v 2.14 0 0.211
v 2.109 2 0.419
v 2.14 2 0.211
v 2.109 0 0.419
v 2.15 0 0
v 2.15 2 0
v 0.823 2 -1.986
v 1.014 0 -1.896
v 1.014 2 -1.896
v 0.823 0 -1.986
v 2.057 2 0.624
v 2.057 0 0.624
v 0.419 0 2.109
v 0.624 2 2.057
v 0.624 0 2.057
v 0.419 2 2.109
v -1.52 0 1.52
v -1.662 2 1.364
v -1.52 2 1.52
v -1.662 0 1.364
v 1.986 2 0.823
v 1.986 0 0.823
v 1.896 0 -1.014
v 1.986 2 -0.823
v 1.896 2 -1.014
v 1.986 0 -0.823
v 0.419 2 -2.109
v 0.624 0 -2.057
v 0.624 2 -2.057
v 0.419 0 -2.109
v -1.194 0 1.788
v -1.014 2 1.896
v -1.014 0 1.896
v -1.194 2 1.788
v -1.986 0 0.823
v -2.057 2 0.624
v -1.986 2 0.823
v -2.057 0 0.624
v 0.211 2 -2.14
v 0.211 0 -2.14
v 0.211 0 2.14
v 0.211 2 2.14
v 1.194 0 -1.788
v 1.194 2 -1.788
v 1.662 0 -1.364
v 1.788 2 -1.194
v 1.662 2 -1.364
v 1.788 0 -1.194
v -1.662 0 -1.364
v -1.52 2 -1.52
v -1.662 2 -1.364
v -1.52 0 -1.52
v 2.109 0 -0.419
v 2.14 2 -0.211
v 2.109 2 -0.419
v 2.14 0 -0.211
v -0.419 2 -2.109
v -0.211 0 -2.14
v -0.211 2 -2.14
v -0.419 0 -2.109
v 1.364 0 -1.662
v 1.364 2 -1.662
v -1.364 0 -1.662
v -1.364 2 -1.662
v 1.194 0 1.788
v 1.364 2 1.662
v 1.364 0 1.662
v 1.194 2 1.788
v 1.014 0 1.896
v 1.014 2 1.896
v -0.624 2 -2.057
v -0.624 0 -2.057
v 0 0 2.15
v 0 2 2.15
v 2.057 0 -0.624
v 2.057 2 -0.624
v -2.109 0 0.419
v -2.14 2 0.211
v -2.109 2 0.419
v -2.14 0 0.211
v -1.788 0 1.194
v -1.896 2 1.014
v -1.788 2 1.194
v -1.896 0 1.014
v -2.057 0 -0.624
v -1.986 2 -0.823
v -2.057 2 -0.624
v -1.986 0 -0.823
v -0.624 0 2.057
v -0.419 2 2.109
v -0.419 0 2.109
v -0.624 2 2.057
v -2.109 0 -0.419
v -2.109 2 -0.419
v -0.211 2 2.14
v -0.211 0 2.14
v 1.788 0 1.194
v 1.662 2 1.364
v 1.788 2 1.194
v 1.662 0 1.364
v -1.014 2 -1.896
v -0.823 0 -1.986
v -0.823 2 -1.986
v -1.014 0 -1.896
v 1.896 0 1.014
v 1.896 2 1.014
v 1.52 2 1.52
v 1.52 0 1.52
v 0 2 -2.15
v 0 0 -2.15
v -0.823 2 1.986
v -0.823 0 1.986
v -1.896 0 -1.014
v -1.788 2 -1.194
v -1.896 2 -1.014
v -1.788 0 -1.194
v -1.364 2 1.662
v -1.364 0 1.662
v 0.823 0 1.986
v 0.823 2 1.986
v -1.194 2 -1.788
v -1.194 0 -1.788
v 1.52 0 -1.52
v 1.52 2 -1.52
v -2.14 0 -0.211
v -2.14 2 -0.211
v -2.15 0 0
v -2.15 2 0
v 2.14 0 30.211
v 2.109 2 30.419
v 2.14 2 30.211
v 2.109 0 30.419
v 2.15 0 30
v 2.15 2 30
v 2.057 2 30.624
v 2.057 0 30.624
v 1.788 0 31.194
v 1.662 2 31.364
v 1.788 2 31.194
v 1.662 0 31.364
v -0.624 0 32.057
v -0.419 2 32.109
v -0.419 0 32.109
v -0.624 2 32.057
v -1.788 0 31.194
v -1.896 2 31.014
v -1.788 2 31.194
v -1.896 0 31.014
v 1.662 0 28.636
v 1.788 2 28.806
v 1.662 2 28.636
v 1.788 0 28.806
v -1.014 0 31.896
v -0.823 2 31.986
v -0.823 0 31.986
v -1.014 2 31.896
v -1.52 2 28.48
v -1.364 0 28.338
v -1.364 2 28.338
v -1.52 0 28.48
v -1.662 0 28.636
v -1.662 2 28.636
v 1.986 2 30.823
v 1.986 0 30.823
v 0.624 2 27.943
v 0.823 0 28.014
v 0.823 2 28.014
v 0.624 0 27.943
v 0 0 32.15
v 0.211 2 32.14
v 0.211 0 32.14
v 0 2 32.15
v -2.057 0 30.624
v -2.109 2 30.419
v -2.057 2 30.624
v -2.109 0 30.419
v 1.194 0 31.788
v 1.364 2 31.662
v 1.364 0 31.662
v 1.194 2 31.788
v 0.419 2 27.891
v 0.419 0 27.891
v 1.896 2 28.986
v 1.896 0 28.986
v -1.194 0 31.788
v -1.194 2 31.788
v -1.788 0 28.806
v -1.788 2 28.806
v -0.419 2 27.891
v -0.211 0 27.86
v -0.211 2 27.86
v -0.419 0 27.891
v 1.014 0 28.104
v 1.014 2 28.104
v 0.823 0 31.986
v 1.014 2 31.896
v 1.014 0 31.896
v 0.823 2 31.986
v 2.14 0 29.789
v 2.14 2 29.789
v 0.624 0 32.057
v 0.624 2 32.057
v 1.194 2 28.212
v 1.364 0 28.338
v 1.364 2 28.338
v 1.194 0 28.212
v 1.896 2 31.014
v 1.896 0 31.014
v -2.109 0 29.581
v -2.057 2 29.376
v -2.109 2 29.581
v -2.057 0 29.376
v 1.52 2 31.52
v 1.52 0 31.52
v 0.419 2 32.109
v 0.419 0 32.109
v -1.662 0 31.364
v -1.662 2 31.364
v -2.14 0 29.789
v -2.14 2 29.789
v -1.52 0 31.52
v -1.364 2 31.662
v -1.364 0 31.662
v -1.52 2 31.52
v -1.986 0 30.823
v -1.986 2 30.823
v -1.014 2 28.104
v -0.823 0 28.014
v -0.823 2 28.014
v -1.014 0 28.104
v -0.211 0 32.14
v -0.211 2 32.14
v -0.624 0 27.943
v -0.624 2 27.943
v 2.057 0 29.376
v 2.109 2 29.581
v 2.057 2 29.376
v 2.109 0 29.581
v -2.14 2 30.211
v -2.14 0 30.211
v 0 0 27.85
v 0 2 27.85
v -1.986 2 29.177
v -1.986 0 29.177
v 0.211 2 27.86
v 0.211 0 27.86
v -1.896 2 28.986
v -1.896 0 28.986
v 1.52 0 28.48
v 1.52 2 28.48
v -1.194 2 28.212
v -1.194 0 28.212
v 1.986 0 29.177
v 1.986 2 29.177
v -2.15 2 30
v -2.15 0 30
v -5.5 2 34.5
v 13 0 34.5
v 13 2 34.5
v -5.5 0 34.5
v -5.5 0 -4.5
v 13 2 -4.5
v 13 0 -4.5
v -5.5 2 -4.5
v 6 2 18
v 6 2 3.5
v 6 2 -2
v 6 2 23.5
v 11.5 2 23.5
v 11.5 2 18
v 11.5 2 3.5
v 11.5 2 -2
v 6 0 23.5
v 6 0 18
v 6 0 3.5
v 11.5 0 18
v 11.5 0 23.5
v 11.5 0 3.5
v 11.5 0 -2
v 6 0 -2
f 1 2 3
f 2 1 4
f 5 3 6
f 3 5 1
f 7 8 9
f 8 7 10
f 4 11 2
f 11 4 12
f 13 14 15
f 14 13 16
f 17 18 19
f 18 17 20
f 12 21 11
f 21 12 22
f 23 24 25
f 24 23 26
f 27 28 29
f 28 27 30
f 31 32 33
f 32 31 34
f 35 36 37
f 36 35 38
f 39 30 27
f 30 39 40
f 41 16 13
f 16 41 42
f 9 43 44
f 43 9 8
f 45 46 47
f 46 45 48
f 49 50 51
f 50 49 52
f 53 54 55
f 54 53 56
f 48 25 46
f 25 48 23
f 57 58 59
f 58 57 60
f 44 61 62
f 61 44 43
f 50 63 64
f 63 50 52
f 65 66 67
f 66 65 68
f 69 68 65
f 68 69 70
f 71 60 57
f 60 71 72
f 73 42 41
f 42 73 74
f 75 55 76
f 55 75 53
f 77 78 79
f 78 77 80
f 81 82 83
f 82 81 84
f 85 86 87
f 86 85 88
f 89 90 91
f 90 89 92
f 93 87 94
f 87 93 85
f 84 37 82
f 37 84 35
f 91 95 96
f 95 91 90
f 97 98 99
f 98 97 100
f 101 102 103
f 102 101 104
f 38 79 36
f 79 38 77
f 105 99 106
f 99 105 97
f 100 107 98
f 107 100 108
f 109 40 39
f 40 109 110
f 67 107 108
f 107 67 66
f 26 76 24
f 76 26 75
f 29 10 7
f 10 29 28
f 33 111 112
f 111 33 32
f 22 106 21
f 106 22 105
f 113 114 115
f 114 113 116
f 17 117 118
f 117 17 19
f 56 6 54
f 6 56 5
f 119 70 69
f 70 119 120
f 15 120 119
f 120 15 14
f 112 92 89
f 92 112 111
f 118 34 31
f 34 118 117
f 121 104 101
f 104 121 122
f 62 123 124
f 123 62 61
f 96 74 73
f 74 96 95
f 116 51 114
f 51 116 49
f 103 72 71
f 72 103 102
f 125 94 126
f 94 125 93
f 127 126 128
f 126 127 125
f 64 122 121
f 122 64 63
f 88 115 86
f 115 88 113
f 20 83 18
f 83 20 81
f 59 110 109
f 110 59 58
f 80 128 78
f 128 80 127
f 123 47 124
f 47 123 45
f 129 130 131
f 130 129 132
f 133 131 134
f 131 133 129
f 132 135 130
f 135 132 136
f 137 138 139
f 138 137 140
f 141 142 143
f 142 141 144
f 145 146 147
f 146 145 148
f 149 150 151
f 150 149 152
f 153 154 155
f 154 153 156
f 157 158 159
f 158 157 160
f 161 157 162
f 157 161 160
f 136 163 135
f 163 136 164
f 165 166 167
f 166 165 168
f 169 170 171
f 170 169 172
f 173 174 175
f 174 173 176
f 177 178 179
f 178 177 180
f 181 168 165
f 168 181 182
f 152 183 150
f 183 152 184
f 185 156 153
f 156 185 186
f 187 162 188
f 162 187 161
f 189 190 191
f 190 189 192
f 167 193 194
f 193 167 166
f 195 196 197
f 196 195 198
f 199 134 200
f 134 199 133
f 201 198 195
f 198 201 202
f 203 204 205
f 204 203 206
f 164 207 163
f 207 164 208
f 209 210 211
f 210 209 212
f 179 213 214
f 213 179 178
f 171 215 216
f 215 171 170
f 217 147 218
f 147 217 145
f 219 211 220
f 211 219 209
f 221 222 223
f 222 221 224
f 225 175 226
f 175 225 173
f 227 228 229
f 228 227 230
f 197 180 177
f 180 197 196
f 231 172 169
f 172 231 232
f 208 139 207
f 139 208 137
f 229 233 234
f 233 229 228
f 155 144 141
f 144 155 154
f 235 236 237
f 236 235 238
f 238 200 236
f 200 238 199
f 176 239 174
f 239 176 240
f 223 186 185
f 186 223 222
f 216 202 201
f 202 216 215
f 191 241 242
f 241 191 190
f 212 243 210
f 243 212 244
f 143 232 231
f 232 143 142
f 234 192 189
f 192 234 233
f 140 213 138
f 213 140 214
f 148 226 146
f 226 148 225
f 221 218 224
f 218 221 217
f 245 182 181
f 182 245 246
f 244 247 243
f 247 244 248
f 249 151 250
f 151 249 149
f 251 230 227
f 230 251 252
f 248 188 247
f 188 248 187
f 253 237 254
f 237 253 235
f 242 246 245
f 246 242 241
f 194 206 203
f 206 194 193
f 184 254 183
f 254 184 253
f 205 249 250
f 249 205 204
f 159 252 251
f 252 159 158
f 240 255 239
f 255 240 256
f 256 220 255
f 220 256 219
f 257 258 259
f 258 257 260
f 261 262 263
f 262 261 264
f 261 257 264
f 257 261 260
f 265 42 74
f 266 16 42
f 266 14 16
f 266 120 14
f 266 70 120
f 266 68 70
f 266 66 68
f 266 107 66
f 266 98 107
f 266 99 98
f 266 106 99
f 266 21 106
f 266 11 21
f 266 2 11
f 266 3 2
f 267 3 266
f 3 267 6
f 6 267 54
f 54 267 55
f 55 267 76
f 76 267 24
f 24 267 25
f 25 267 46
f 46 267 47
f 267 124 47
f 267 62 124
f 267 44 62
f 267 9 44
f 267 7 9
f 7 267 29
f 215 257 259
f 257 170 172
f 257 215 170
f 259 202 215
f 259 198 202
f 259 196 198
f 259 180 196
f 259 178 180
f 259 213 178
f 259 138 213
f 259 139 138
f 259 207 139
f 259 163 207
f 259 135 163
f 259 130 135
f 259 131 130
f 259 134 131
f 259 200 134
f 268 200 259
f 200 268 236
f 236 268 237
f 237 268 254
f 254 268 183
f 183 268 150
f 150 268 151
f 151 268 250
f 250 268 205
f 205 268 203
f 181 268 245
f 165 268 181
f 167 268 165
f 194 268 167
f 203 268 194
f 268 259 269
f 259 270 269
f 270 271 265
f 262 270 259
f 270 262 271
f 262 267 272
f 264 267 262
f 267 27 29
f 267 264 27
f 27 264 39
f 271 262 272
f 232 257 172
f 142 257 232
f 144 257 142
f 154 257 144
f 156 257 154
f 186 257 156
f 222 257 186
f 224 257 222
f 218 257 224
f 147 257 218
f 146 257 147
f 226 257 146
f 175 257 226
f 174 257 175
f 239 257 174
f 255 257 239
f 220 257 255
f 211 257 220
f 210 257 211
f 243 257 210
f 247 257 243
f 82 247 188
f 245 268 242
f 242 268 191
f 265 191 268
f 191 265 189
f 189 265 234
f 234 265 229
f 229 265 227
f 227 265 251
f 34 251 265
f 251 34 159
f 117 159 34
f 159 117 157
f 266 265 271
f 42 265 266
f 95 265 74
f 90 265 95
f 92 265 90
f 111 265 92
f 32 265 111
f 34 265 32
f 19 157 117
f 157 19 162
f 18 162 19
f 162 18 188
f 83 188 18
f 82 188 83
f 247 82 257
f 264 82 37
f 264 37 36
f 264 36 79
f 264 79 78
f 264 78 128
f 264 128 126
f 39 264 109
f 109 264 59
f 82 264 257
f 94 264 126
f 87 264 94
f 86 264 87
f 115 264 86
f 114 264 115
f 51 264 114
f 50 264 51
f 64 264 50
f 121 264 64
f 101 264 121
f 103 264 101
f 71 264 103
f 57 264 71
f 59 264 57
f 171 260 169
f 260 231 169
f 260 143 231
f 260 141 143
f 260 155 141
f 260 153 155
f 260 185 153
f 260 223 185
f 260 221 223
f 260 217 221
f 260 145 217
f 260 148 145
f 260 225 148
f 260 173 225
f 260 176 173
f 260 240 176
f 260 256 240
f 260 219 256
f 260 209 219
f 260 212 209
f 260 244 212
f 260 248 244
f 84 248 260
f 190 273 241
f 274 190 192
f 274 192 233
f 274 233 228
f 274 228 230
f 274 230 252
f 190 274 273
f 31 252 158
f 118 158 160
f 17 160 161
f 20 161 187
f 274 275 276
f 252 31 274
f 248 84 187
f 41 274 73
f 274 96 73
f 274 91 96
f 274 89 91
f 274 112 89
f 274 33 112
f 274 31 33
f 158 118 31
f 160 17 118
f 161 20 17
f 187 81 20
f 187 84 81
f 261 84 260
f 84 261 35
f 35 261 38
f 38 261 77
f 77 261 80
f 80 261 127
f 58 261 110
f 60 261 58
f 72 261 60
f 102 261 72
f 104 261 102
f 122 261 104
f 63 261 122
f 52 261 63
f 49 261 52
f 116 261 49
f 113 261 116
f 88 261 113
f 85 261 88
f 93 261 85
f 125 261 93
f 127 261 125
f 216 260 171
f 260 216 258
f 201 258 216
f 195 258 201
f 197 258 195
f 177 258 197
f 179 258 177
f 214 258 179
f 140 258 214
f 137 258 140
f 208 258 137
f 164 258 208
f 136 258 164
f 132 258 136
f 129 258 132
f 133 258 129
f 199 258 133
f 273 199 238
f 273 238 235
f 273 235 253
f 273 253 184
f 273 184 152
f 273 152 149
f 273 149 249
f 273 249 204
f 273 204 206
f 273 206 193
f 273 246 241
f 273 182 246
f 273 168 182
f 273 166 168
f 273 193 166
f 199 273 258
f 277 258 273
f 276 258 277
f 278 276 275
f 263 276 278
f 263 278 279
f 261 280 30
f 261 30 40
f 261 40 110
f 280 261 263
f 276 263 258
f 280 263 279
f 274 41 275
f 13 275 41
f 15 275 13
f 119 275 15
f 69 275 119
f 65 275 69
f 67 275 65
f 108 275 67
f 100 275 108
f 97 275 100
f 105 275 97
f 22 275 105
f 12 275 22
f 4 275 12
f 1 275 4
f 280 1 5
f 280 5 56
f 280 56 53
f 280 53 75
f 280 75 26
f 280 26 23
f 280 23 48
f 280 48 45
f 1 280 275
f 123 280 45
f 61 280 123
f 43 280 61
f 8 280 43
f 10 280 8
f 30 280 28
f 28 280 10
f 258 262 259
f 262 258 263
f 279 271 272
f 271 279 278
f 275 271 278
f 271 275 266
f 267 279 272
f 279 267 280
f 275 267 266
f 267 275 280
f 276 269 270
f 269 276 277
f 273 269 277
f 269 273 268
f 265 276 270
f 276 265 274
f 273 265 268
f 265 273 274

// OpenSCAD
// file: rockpro.scad
include <../common.scad>

// All coordinates are in [x,y], or [x,y,z] format

pcbDimensions = [79.41, 127.06]; // [x,y]
pcbThickness = 1.22;

// TODO move mount points
mountPoints = [[0,0,0], [0,118,0], [71.0,118, 0], [71.0,0,0]];

module mountPoints_N(cylHeight, cylRad1, cylRad2, cylFn, center) {
  for (i=[0:3]) {
    p = mountPoints[i];
    translate(v=[p[0], p[1], p[2]])
    cylinder(r1=cylRad1, r2=cylRad2, h=cylHeight, $fn=cylFn, center=center);
  }
  
}

module pcb() {
  cube(size=[pcbDimensions[0], pcbDimensions[1], pcbThickness]);
}

// defined on x-z plane, start at top of pcb
module frontFaceIOCutouts_N() {
  translate(v=[9,0,0])
    cube(size=[26.0,inf50,7.5]);

  translate(v=[35,0,0])
    cube(size=[35,inf50,17.9]);
}
module backFaceIOCutouts_N() {
  translate(v=[9,0,0])
    cube(size=[61,inf50,14]);
}


module cutoutProfile_N() {

  color([1,0,1])
  union() {
  mirror(v=[0,1,0])
    translate(v=[0,-1,pcbThickness])
    frontFaceIOCutouts_N();

  translate(v=[0,pcbDimensions[1]-1, pcbThickness])
  backFaceIOCutouts_N();
  }

  color([0.3,0.8,0.1])
  difference() {
    pcb();
    translate(v=[3.75, 3.75])
      mountPoints_N(10,2,2,10,true);
  }
}

//cutoutProfile_N();


//mountPoints_N(10,2,2, true);
// file: ../rack/screws.scad
/* Some common screw dimensions */


inf = 400; // basically infinity

/********************************************************************************/
// M3 dimensions

m3HoleRadiusSlack = 0.15;
m3Diameter = 3.0;
m3Radius = m3Diameter/2.0;

m3RadiusSlacked = m3Radius + m3HoleRadiusSlack;

// legacy TODO: replace
m3ptr = m3RadiusSlacked;

// NUTS!
m3HexNutWidthAcrossFlats = 5.41;
m3HexNutWidthAcrossCorners = FtoG(m3HexNutWidthAcrossFlats);

m3HexNutThickness = 2.18;

module m3HexNutPocketNegative() {
  hexNutPocketNegative(m3RadiusSlacked,
                       m3HexNutWidthAcrossCorners/2 + 0.1,
                       m3HexNutThickness + 0.2);
}


// TODO: remove test

*difference() {
  cube(size=[8,12,5], center=true);

  rotate(a=[0,0,20])
  m3HexNutPocketNegative();
}

*m3HexNutPocketNegative();


/********************************************************************************/
// M4 dimensions

m4HoleRadiusSlack = 0.15;
m4Diameter = 4.0;
m4Radius = m4Diameter/2.0;
m4RadiusSlacked = m4Radius + m4HoleRadiusSlack;

m4HexNutWidthAcrossFlats = 6.89;
m4HexNutWidthAcrossCorners = FtoG(m4HexNutWidthAcrossFlats);

m4HexNutThickness = 3.07;

module m4HexNutPocketNegative() {
  hexNutPocketNegative(m4RadiusSlacked,
                       m4HexNutWidthAcrossCorners/2 + 0.1,
                       m4HexNutThickness + 0.2);
}


// TODO: remove test

*difference() {
  translate(v=[0,1,0])
  cube(size=[10,12,6], center=true);

  rotate(a=[0,0,20])
  m4HexNutPocketNegative();
}

*m4HexNutPocketNegative();

/********************************************************************************/

// Convert a regular hexagon widthAcrossFlats to widthAcrossCorners
function FtoG(widthAcrossFlats) = widthAcrossFlats * (2/sqrt(3));  

// Convert a regular hexagon widthAcrossCorners to widthAcrossFlats
function GtoF(widthAcrossCorners) =  widthAcrossCorners * (sqrt(3)/2);


module hexNutPocketNegative(
  innerRadius,
  widthAcrossCorners,
  thickness)
{

  union() {

    hull() {
      // hexagonal cylinder representing where the nut should fit
      cylinder(r=widthAcrossCorners, h=thickness, center=true, $fn=6);

      // negative volume for sliding in the nut
      translate(v=[inf,0,0])
      cylinder(r=widthAcrossCorners, h=thickness, center=true, $fn=6);
    }

    // negative volume for screw lead
    translate(v=[0,0,-10])
    cylinder(r=innerRadius, h = inf, $fn=32);

    hull() {
     translate(v=[inf,0,0])
       cylinder(r=innerRadius, h = inf, $fn=32);
     cylinder(r=innerRadius, h = inf, $fn=32);
    }
  }
}
// file: ../common.scad
/* Some initial configurations and commonly used variables
   plus functions
*/

$fn=64;


eps=0.01;

inf10 = 10;
inf50 = 50;
inf1000 = 1000;
inf = inf1000;
// file: ../rack-tray/rack-tray.scad
eps=0.01;
vU = 2;
uHeight = 10;

plateScrewDiffV = uHeight*vU;
plateScrewDiffH = 180;

plateScrewToHEdge = 4.5;
plateScrewToVEdge = 5.5;

frontPlateThickness = 3;

frontPlateV = plateScrewDiffV + 2*plateScrewToHEdge;
frontPlateH = plateScrewDiffH + 2*plateScrewToVEdge;

//////////////////////////////////////////////////////

trayOuterHeight = 28;
trayOuterWidth = 168;
trayOuterDepth = 130;

trayBottomThickness = 2;
traySideThickness = 3;
trayFrontThickness = 2;


trayInnerWidth = trayOuterWidth - 2*traySideThickness;
trayInnerDepth = trayOuterDepth - trayFrontThickness;
trayInnerHeight = trayOuterHeight - trayBottomThickness;

module _trayBody() {

    difference() {
        cube(size = [trayOuterWidth, trayOuterDepth, trayOuterHeight]);

        union() {
            translate(v = [traySideThickness, trayFrontThickness, trayBottomThickness])
                cube(size = [trayInnerWidth + eps, trayInnerDepth + eps, trayInnerHeight + eps]);


            translate(v=[0,0, trayOuterHeight])
                rotate(a=[-atan(trayInnerHeight/trayOuterDepth),0,0])
                    cube(size=[trayOuterWidth+eps, 2*trayOuterDepth+eps, trayInnerHeight+eps]);

            translate(v=[5+traySideThickness,0,trayBottomThickness])
            cube(size=[trayInnerWidth-10, trayFrontThickness+eps, trayOuterHeight]);
        }
    }
}

// todo make a nice module for this (triangular prism)
module _sideHole_N() {
    scale(v=[2,0.65,0.65])
        difference () {
            cube(size = [trayOuterWidth, trayOuterDepth, trayOuterHeight]);
            translate(v = [0, 0, trayOuterHeight])
                rotate(a = [- atan(trayInnerHeight / trayOuterDepth), 0, 0])
                    cube(size = [trayOuterWidth + eps, 2 * trayOuterDepth + eps, trayInnerHeight + eps]);
        }
}


module trayBody() {
    union() {
        difference() {
            _trayBody();
            union() {
                // bottom holes
                for (i = [0:7]) {
                    translate(v = [35, i * 15 + 10, - eps])
                        *cube(size = [100, 5, 10]);
                }
                translate(v=[-10,5,5])
                _sideHole_N();
            }
        }

        // lugs for front
        translate(v=[0,-2,0])
            cube(size=[5,2,5]);
        translate(v=[trayOuterWidth-5,-2,0])
            cube(size=[5,2,5]);

        translate(v=[0,-2,20])
            cube(size=[5,2,5]);
        translate(v=[trayOuterWidth-5,-2,20])
            cube(size=[5,2,5]);
    }
}




//trayBody();
// main file
include <../rack-tray/rack-tray.scad>
include <../common.scad>
include <../rack/screws.scad>
include <./rockpro.scad>

vU = 3;
uHeight = 10;

plateScrewDiffV = uHeight*vU;
plateScrewDiffH = 180;

plateScrewToHEdge = 4.5;
plateScrewToVEdge = 5.5;

frontPlateThickness = 2;

frontPlateV = plateScrewDiffV + 2*plateScrewToHEdge;
frontPlateH = plateScrewDiffH + 2*plateScrewToVEdge;


plateScrewToBoxMin = 6;

module _frontPlateBody() {
    translate(v=[-plateScrewToVEdge,0,-plateScrewToHEdge])
        cube(size=[frontPlateH,frontPlateThickness,frontPlateV]);
}

module _plateHole() {
    rotate(a=[90,0,0])
        cylinder(r=m4RadiusSlacked, h=inf, center=true);
}


module frontPlate() {

    difference() {
        _frontPlateBody();

        union() {
            // TODO: introduce helper modules for this pattern
            _plateHole();

            translate(v=[plateScrewDiffH,0,0])
                _plateHole();

            translate(v=[0,0,plateScrewDiffV])
                _plateHole();

            translate(v=[plateScrewDiffH,0,plateScrewDiffV])
                _plateHole();
        }
    }
}

difference() {
    frontPlate();
    union() {
        translate(v = [13, 0, - 10])
            cube(size = [300, 100, 100]);

        translate(v=[6,0,-2])
            cube(size=[5.5,5.5,5.5]);

        translate(v=[6,0,20-2])
            cube(size=[5.5,5.5,5.5]);
    }
}



// todo use library constants
// TODO these risers are prone to snapping off
module screwRiser(height) {
    difference() {
        cylinder(d=5, h=height, $fn=64);
        cylinder(d=2.88, h=height, $fn=64);
    }
}

module mountPoints_N(cylHeight, cylRad1, cylRad2, cylFn, center) {
    for (i=[0:3]) {
        p = mountPoints[i];
        translate(v=[p[0], p[1], p[2]])
            cylinder(r1=cylRad1, r2=cylRad2, h=cylHeight, $fn=cylFn, center=center);
    }

}

module rockProScrewMounts() {
    for (i=[0:3]) {
        p = mountPoints[i];
        translate(v=[p[0], p[1], p[2]])
            screwRiser(5);
    }
}


module rockProDualTray() {


    trayBody();
    translate(v=[9,8,trayBottomThickness])
        rockProScrewMounts();

    translate(v=[9 + pcbDimensions[0],8,trayBottomThickness])
        rockProScrewMounts();

}

*difference() {
    rockProDualTray();
    // file specific bottom holes
    union() {
        translate(v = [10, 15, 0])
            minkowski() {
                cube(size = [69, 100, 5]);
                cylinder(r = 1);
            }

        translate(v=[88,15,0])
            minkowski() {
                cube(size = [69, 100, 5]);
                cylinder(r=1);
            }
    }
}
